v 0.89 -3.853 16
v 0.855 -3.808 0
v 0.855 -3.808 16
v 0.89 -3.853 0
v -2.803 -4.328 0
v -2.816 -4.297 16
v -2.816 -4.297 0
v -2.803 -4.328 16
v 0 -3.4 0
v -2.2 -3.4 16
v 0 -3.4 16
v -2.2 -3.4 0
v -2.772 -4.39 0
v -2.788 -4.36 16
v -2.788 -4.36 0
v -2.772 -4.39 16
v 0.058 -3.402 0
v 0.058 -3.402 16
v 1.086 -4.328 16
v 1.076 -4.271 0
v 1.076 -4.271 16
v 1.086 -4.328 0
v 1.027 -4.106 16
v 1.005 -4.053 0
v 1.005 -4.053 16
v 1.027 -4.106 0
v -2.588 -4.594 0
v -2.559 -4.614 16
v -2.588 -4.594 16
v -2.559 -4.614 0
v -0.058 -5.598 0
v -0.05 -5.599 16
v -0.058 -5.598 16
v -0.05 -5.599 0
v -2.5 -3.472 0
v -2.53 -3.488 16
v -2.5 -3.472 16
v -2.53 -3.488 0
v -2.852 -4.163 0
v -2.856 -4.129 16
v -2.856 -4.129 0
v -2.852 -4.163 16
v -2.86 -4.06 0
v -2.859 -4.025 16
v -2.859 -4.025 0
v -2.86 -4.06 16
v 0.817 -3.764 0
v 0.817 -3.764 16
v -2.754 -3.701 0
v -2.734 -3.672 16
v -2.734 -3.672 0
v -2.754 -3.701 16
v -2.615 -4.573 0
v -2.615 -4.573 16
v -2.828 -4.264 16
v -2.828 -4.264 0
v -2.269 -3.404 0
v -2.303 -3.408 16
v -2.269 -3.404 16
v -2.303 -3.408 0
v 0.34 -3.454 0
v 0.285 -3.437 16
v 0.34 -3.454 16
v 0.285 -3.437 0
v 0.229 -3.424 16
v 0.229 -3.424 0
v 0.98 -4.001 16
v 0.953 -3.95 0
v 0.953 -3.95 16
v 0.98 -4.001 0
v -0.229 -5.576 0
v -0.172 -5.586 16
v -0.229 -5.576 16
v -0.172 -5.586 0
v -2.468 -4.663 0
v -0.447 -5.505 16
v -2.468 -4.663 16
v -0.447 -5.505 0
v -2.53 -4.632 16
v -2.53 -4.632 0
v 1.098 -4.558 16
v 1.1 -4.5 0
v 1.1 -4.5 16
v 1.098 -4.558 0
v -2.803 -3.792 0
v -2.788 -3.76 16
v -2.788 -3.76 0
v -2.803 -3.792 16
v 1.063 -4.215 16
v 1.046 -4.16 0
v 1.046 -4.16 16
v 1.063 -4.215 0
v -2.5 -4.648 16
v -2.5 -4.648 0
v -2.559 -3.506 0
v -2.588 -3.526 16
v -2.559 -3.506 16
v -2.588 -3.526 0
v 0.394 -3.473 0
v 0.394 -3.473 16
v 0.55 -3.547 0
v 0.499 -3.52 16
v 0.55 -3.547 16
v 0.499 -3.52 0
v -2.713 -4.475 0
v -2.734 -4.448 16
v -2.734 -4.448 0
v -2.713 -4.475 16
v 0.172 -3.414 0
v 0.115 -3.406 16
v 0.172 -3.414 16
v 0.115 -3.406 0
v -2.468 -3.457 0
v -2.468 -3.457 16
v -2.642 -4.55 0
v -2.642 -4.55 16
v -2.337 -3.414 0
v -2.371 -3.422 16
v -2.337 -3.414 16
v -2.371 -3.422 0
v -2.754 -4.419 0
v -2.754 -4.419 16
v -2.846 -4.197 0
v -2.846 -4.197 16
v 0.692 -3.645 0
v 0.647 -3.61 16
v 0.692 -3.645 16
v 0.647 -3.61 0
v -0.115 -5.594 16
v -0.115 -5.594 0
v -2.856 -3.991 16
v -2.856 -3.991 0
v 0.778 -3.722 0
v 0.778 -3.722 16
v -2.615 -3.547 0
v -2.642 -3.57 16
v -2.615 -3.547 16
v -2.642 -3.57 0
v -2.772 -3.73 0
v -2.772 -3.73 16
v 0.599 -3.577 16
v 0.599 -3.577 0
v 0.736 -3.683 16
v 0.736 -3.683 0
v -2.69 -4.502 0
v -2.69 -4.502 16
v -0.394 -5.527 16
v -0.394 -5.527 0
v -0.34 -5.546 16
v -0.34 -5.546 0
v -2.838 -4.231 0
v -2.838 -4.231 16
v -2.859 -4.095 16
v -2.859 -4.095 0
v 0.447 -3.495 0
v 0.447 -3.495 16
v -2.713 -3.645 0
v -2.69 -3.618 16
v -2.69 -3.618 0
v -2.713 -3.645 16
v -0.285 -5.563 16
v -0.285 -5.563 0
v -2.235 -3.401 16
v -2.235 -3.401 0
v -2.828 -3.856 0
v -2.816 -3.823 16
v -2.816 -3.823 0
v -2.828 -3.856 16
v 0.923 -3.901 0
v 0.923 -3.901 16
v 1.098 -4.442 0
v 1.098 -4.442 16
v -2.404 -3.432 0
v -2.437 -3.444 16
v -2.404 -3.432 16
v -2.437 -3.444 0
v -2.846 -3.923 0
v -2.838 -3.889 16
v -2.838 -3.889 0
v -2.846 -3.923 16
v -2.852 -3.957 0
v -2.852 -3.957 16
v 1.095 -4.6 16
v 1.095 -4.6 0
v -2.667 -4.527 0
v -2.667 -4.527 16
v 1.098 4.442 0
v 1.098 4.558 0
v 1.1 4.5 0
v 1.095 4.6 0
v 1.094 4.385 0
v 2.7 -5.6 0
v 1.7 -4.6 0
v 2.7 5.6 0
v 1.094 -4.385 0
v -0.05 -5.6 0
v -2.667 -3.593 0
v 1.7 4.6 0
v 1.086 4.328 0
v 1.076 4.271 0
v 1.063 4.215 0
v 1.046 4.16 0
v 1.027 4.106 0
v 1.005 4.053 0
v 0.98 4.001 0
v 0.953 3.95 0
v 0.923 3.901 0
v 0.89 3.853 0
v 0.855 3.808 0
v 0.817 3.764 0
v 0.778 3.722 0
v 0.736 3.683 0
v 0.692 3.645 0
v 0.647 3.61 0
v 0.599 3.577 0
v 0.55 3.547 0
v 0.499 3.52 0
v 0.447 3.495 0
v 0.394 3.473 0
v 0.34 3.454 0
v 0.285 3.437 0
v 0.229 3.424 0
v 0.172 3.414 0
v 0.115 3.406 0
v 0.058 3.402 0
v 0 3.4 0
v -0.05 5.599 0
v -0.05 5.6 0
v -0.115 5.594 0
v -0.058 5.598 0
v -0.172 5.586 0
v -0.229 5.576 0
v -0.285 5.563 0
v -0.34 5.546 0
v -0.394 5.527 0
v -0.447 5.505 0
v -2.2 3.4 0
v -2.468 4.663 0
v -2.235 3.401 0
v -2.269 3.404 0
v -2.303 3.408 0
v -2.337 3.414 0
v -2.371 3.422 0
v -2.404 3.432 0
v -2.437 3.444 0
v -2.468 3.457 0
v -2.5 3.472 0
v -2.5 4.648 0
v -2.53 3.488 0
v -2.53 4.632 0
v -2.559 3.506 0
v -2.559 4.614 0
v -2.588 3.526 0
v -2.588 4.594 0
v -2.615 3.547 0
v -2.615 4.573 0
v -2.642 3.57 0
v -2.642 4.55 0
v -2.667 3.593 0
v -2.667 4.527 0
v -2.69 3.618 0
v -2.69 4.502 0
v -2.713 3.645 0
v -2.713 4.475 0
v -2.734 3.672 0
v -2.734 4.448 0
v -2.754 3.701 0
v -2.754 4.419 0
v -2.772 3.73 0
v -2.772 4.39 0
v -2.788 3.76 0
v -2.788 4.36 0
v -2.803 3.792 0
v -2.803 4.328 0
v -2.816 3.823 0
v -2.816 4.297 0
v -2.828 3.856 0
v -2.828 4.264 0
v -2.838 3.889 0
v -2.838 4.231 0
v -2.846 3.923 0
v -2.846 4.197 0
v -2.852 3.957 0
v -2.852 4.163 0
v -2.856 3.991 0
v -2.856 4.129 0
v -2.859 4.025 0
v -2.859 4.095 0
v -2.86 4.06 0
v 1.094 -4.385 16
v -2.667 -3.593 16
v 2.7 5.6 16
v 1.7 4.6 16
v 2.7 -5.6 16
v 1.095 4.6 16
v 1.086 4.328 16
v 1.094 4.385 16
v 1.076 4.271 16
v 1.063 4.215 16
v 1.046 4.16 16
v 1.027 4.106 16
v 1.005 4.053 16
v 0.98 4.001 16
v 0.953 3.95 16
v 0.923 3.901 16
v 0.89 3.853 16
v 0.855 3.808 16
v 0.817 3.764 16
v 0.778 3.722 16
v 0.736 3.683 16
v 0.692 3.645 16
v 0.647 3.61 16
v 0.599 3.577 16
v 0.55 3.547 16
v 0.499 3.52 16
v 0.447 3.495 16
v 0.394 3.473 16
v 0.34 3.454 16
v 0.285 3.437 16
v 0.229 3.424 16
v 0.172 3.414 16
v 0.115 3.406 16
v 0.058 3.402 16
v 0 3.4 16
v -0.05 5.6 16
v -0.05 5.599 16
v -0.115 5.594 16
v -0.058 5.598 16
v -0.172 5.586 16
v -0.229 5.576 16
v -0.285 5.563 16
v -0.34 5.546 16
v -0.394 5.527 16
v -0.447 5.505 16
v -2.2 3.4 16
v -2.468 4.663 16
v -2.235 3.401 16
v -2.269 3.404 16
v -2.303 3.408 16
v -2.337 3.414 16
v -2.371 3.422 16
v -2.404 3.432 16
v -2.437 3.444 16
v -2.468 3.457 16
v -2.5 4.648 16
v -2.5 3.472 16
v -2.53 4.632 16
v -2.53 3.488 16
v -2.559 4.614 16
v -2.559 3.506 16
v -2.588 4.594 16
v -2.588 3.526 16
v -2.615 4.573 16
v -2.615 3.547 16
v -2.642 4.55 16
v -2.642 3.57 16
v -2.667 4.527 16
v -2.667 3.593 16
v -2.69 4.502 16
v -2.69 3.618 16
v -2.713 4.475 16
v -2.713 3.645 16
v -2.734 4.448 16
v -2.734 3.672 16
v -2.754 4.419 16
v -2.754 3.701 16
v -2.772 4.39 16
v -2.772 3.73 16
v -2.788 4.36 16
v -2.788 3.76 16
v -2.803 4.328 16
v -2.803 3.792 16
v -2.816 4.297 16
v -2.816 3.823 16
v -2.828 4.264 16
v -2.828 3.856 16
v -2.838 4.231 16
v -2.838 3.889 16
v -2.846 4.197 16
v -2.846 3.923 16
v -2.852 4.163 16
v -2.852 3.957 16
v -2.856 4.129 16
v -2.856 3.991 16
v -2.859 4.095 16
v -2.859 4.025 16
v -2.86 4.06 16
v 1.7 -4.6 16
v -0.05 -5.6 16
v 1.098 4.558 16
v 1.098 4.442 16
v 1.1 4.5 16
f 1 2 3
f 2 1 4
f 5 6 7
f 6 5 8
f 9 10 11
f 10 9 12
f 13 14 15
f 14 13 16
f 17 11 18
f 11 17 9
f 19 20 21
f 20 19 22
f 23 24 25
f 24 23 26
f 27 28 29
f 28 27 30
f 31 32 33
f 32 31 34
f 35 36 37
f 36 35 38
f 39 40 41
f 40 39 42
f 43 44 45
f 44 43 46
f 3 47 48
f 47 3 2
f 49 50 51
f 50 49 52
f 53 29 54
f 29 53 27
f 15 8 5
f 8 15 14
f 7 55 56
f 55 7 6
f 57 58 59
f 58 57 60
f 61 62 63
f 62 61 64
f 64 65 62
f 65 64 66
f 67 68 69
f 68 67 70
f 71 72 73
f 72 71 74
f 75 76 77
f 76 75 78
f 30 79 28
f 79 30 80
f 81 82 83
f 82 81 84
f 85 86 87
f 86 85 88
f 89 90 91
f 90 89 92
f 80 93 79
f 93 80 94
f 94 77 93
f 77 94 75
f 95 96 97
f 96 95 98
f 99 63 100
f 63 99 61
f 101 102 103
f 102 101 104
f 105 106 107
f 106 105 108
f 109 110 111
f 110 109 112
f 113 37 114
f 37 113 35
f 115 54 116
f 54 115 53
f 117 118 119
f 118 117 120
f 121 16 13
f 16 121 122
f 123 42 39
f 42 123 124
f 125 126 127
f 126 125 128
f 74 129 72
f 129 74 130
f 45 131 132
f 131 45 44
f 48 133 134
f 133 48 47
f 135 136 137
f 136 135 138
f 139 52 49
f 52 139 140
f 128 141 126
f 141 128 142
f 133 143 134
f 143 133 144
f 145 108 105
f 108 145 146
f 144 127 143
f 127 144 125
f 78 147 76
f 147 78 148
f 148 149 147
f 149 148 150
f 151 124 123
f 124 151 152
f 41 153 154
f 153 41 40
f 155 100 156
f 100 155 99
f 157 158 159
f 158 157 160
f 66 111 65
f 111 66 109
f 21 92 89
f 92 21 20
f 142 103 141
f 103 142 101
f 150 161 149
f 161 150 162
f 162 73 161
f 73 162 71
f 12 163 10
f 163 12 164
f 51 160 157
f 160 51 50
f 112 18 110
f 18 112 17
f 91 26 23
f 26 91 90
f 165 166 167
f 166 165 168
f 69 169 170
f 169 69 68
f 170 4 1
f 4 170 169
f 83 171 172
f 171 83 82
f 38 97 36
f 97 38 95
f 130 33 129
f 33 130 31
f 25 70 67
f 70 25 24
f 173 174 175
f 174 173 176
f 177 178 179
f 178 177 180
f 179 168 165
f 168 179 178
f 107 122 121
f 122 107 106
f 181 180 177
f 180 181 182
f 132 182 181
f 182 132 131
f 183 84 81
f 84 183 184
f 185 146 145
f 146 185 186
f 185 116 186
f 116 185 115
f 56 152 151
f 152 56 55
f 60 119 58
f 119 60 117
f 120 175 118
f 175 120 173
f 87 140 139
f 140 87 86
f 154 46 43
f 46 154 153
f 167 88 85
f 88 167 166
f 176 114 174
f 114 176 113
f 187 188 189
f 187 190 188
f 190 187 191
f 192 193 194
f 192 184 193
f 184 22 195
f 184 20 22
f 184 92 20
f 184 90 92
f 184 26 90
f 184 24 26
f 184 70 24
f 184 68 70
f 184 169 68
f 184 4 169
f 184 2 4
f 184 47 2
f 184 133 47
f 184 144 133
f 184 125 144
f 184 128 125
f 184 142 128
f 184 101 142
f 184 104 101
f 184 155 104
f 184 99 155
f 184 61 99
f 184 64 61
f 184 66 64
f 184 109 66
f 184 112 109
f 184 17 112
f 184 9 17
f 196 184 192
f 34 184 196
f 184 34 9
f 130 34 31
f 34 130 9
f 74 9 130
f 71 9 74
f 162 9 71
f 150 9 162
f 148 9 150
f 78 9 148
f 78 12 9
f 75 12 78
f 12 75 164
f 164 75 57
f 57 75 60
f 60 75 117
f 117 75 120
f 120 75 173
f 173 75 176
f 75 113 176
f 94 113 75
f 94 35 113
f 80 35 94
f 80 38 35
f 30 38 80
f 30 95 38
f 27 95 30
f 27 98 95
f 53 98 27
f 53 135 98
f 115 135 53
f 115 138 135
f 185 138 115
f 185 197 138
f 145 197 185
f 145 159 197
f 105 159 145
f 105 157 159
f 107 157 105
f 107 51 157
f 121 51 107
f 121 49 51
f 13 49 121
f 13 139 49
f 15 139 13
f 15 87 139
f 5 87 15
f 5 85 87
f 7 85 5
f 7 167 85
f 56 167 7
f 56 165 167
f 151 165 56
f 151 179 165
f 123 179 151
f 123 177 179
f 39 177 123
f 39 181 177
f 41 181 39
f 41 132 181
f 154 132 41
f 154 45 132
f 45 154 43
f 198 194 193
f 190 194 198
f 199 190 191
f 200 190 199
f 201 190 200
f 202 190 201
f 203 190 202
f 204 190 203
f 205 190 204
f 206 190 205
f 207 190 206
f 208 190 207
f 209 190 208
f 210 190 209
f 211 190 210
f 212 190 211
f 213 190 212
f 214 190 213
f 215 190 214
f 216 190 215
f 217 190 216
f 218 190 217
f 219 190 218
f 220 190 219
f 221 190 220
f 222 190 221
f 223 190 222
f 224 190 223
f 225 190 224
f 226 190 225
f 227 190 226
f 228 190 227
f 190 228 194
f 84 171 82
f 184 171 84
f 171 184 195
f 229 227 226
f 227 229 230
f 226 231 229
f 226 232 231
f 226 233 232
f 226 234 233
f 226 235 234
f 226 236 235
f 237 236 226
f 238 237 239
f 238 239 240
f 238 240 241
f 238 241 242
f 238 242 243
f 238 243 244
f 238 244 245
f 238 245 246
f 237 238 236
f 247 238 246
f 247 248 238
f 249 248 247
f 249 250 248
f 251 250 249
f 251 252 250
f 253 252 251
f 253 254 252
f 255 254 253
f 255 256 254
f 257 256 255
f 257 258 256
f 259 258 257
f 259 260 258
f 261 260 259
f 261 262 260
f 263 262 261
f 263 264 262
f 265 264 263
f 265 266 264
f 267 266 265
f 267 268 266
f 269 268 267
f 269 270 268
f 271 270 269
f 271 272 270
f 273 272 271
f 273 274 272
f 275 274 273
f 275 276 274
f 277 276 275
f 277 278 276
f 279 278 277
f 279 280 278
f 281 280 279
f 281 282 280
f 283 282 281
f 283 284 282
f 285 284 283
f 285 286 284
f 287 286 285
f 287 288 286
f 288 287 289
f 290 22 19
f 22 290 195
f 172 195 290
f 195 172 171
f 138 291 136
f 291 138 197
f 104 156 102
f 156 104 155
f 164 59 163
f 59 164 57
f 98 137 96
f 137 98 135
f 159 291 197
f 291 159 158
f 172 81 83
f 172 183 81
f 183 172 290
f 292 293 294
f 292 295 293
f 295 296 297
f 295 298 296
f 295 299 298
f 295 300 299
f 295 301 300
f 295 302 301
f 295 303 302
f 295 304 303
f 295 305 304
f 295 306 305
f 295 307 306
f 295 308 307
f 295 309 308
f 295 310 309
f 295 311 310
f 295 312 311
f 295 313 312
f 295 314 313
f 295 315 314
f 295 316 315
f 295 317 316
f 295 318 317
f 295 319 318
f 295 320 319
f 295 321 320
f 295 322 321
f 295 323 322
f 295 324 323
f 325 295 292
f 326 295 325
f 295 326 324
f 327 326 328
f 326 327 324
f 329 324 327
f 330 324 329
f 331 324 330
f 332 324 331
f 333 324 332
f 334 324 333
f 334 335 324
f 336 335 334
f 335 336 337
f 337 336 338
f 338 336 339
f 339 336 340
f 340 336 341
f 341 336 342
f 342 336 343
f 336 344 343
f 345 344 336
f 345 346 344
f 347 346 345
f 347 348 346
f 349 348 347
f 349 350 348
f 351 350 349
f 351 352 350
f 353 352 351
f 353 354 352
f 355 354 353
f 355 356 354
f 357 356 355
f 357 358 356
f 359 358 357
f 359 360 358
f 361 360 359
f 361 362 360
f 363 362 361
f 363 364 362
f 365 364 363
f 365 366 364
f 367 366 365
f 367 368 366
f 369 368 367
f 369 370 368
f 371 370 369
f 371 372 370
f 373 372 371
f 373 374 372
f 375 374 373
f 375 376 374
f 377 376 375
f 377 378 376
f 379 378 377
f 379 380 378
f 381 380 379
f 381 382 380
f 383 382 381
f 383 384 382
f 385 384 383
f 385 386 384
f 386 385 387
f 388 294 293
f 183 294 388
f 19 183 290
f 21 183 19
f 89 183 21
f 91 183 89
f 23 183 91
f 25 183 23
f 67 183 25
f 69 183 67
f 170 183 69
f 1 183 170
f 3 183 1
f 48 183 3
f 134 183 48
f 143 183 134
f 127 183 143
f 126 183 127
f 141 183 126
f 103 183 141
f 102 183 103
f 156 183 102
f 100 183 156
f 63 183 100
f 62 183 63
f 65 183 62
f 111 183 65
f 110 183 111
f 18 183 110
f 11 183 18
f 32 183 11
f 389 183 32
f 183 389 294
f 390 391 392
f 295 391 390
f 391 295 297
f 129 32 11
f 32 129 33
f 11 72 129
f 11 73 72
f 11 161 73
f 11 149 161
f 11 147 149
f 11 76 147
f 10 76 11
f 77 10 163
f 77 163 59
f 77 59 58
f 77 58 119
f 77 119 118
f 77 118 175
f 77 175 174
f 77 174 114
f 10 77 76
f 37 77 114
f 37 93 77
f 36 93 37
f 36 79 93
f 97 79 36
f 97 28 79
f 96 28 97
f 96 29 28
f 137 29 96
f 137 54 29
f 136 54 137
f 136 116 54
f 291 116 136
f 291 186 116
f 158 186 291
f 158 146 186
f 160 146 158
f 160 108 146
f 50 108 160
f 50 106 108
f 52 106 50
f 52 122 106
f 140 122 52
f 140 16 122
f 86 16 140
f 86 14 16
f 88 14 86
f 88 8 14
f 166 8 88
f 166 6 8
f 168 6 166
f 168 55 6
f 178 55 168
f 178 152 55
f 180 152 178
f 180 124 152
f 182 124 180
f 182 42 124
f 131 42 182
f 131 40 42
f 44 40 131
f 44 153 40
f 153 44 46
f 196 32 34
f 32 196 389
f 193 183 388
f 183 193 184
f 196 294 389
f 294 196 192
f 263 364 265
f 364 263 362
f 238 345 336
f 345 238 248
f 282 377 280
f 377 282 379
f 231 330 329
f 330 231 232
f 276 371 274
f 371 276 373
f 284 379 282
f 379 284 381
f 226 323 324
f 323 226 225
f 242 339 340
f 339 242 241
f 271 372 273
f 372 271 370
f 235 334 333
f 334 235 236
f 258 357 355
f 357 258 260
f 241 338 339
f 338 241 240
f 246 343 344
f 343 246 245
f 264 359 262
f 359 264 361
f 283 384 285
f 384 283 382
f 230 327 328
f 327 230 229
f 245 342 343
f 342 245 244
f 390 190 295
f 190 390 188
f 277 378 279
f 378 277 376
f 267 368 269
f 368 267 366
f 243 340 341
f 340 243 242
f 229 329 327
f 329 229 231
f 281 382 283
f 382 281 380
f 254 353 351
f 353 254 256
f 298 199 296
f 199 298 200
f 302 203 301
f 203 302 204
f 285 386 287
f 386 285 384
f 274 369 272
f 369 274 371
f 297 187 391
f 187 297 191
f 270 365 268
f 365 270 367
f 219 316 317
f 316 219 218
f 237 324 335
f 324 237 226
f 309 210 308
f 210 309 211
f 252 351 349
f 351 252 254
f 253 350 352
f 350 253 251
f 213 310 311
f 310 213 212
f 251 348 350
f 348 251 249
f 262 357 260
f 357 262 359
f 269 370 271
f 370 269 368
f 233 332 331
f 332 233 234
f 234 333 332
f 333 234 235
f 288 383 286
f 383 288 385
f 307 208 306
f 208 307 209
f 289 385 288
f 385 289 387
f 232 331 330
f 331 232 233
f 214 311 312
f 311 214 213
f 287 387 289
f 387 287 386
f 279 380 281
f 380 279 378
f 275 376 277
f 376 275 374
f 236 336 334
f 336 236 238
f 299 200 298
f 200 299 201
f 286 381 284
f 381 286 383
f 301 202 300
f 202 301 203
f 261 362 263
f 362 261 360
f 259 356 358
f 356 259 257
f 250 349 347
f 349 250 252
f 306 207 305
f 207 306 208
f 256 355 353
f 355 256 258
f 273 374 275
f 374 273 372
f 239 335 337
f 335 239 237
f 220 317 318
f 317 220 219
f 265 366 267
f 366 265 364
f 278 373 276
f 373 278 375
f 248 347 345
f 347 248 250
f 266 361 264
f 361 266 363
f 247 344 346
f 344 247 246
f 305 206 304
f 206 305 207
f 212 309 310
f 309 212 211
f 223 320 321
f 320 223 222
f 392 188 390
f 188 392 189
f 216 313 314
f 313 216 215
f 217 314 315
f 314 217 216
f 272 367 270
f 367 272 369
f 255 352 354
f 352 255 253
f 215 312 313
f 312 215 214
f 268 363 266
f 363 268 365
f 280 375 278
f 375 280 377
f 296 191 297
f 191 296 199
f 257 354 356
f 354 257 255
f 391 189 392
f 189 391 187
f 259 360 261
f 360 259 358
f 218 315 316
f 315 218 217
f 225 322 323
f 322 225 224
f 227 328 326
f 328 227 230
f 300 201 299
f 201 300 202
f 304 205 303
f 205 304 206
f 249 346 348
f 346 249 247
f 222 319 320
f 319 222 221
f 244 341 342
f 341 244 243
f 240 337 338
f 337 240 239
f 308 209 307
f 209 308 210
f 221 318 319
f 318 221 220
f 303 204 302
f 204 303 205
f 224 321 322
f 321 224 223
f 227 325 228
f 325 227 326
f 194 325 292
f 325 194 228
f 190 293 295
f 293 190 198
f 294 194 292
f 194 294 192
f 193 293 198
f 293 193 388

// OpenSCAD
_style = "square"; // [round, square]

// height of the platform (use a slightly smaller value, about 0.2mm to make the clip tight)
_platformGap = 6.8;


// length of the clip
_length = 16.0; //[4:50]


// thickness of the clip.
_wallThickness = 1.0;


// size of the top of the clip
_diameter = 2.2;

////////////////////////////////////////////////////////////////////////

// only works from [0 to 180] degrees, runs clockwise from 12 o'clock
module smallArc(radius0, radius1, angle, depth) {
	thickness = radius1 - radius0;
	eps = 0.01;

	union() {
		difference() {
			// full arc
			cylinder(r=radius1, h=depth, center=true);
			cylinder(r=radius0, h=depth+2*eps, center=true);

			for(z=[0, 180 - angle]) {
				rotate([0,0,z])
				translate([-radius1,0,0])			
				cube(size = [radius1*2, radius1*2, depth+eps], center=true);
			}
		}
	}
}



// arc from [0 to 360] degrees with rounded ends, runs clockwise from 12 o'clock, rounded tips not included in angle computation
module roundArc(radius0, radius1, angle, depth) {
	thickness = radius1 - radius0;
	cutAngle = 360-angle;
	centerRadius = (radius0 + radius1)/2.0;
	union() {
		if (angle > 180) {
			smallArc(radius0, radius1, 180, depth);
			rotate([0,0,-180]) {
				smallArc(radius0, radius1, angle-180, depth);
			}
		} else {
			smallArc(radius0, radius1, angle, depth);
		}

		// round ends
		for(t = [ [0,centerRadius,0], 
					 [centerRadius * -sin(cutAngle), centerRadius * cos(cutAngle),0] ]) {
			translate(t) {
				cylinder(r=thickness/2, h=depth, center=true);
			}
		}
	}
}

module clip(arcRadius, angle, height, outerThickness, hingeRadius, hingeAngle, clipAngle, hingeGap) {
	ir = arcRadius;
	or = ir + outerThickness;
	clipRadius = hingeRadius;
	hx = (ir-hingeRadius)*sin(angle/2);
	hy = (ir-hingeRadius)*cos(angle/2);
	cx = (ir-clipRadius)*sin(angle/2);
	cy = (ir-clipRadius)*cos(angle/2);

	union() {

		difference() {
			//	spine
			rotate([0,0,angle/2]) {
				roundArc(ir, or, angle, height);
			}
		}

		// hinge
		translate([-hx, hy, 0])
		rotate([0,0,angle/2+hingeAngle]) {
			roundArc(hingeRadius, hingeRadius+outerThickness, hingeAngle, height);
		}

		// clip
		translate([cx, cy, 0])
		rotate([0,0,-angle/2]) {
			roundArc(clipRadius, clipRadius+outerThickness, clipAngle, height);
		}
	}
}

// reuse code from the arc clip
module buildRoundClip(gap, width, wall, diameter) {
	curvature = 25;
	clipAngle = 120;
	hingeAngle = 280 - wall*10;
	length = gap + diameter/3 + wall; // approximate
	radius = length / (2 *(curvature/100));
	angle = 2 * asin(length/(2*radius));

	translate([0,-radius,width/2]) {
		clip(radius, angle, width, wall, diameter/2, hingeAngle, clipAngle);
	}
}
////////////////////////////////////////////////////////////////////////

module buildSquareClip(gap, width, wall, diameter) {
	radius = diameter/2;
	tipRadius = diameter * 0.3;
	clipDepth = 1.0; // depth of the clip prongs
	space = 0.6; // space between clip and spine
	eps = 0.1;
	for (y = [-1,1]) {
		hull() {
			translate([0,y*(gap/2 + radius),0]) {
				cylinder(r=radius, h=width);
			}
			translate([-diameter*clipDepth,y*(gap/2 + tipRadius),0]) {
				cylinder(r=tipRadius, h=width);
			}
		}
		
		translate([(radius+space)/2, y*(gap/2 + diameter - wall/2), width/2]) {
			cube(size=[radius + space + eps, wall, width], center=true);
		}
	}
	translate([radius + space + wall/2, 0, width/2]) {
		cube(size=[wall, gap + diameter*2, width], center=true);
	}
}

module make($fn = 120) {
	if (_style == "round") {
		buildRoundClip(_platformGap, _length, _wallThickness, _diameter);
	} else {
		buildSquareClip(_platformGap, _length, _wallThickness, _diameter);
	}
}

make();
